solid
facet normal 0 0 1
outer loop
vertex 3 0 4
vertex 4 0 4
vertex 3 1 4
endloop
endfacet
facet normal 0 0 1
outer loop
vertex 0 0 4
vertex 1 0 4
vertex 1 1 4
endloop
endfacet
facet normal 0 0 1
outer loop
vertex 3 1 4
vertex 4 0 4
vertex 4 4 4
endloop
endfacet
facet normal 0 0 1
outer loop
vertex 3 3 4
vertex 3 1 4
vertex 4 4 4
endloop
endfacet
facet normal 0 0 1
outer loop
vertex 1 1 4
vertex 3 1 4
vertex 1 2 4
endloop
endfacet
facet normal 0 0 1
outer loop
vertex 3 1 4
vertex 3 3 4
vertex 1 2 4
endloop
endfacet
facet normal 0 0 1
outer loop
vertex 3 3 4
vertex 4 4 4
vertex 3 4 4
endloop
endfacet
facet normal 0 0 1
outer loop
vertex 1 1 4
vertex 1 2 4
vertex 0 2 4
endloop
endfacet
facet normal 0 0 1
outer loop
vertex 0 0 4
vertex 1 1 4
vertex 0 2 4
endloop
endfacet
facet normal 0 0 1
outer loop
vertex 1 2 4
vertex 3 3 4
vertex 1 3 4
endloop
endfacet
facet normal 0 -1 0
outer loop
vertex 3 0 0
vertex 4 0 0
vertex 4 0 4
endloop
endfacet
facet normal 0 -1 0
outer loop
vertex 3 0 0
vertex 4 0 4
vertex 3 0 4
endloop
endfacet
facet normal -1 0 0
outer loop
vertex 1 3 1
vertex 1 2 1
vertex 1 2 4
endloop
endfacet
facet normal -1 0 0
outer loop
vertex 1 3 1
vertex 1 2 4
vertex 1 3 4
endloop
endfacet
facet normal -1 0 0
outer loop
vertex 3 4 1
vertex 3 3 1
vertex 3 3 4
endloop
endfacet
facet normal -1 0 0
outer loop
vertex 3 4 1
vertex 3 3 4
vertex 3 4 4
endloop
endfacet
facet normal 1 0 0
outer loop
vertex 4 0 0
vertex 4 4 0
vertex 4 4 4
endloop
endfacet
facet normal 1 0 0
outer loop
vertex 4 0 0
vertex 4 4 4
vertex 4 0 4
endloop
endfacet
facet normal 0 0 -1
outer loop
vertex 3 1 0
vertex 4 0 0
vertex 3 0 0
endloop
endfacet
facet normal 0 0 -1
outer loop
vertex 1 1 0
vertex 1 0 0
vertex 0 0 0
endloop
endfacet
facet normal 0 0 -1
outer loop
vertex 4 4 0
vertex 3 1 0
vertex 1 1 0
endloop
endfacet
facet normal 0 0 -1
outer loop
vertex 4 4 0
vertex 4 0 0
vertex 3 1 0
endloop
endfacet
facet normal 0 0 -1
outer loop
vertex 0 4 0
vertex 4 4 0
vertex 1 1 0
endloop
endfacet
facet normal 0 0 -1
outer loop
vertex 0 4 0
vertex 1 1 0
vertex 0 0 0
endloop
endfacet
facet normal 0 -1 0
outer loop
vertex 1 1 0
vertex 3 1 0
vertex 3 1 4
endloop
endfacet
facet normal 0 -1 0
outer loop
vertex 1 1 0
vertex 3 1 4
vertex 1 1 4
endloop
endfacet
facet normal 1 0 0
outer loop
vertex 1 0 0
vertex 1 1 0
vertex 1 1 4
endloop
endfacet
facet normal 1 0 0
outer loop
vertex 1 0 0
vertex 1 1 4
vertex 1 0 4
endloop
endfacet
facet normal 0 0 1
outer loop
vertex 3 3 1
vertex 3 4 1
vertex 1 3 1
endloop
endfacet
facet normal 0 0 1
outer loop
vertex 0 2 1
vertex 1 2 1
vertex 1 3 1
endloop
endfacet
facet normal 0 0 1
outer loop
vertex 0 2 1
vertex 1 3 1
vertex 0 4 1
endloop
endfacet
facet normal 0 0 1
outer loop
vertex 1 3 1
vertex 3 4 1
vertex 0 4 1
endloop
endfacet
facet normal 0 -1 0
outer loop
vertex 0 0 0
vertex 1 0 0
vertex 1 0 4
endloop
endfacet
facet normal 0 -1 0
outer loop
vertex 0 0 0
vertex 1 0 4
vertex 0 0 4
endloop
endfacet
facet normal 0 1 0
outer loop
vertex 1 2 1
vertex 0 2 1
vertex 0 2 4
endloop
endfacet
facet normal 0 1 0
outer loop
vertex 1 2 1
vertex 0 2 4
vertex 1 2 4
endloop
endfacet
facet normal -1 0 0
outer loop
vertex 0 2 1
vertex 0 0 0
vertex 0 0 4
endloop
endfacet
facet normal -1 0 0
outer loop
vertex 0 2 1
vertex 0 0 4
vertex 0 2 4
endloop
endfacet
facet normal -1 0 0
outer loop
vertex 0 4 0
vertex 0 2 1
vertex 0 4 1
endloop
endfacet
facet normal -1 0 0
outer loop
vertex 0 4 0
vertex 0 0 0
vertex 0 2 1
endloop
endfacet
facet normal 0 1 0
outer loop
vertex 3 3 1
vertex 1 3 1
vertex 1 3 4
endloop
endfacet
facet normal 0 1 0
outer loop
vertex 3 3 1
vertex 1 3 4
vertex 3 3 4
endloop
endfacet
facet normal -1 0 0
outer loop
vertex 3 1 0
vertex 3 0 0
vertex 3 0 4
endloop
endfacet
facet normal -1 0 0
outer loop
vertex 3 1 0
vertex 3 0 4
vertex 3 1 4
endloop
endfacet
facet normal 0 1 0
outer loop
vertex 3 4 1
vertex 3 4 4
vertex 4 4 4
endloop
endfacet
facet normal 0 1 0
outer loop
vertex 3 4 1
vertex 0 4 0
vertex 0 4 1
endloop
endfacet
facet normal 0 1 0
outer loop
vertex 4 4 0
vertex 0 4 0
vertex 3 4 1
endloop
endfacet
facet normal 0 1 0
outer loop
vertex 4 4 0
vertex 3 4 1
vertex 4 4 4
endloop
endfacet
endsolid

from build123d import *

# Parameters (mm, degrees)
BOSS_EXTRUDE1_DEPTH = 4
SKETCH5_W           = 3
SKETCH5_H           = 2
BOSS_EXTRUDE3_DEPTH = 1


with BuildPart() as part:
    # Sketch1 → Boss-Extrude1 (new body)
    with BuildSketch(Plane.XY):
        Polygon((0, 0), (0, 2), (1, 2), (1, 3), (3, 3), (3, 4), (4, 4), (4, 0), (3, 0), (3, 1), (1, 1), (1, 0), align=None)
    extrude(amount=BOSS_EXTRUDE1_DEPTH)

    # Sketch5 → Boss-Extrude3 (add)
    with BuildSketch(Plane(origin=(0, 0, 0), x_dir=(-1, 0, 0), z_dir=(0, 0, -1))):
        with Locations((-1.5, 3)):
            Rectangle(SKETCH5_W, SKETCH5_H)
    extrude(amount=-BOSS_EXTRUDE3_DEPTH)


solid = part.part
